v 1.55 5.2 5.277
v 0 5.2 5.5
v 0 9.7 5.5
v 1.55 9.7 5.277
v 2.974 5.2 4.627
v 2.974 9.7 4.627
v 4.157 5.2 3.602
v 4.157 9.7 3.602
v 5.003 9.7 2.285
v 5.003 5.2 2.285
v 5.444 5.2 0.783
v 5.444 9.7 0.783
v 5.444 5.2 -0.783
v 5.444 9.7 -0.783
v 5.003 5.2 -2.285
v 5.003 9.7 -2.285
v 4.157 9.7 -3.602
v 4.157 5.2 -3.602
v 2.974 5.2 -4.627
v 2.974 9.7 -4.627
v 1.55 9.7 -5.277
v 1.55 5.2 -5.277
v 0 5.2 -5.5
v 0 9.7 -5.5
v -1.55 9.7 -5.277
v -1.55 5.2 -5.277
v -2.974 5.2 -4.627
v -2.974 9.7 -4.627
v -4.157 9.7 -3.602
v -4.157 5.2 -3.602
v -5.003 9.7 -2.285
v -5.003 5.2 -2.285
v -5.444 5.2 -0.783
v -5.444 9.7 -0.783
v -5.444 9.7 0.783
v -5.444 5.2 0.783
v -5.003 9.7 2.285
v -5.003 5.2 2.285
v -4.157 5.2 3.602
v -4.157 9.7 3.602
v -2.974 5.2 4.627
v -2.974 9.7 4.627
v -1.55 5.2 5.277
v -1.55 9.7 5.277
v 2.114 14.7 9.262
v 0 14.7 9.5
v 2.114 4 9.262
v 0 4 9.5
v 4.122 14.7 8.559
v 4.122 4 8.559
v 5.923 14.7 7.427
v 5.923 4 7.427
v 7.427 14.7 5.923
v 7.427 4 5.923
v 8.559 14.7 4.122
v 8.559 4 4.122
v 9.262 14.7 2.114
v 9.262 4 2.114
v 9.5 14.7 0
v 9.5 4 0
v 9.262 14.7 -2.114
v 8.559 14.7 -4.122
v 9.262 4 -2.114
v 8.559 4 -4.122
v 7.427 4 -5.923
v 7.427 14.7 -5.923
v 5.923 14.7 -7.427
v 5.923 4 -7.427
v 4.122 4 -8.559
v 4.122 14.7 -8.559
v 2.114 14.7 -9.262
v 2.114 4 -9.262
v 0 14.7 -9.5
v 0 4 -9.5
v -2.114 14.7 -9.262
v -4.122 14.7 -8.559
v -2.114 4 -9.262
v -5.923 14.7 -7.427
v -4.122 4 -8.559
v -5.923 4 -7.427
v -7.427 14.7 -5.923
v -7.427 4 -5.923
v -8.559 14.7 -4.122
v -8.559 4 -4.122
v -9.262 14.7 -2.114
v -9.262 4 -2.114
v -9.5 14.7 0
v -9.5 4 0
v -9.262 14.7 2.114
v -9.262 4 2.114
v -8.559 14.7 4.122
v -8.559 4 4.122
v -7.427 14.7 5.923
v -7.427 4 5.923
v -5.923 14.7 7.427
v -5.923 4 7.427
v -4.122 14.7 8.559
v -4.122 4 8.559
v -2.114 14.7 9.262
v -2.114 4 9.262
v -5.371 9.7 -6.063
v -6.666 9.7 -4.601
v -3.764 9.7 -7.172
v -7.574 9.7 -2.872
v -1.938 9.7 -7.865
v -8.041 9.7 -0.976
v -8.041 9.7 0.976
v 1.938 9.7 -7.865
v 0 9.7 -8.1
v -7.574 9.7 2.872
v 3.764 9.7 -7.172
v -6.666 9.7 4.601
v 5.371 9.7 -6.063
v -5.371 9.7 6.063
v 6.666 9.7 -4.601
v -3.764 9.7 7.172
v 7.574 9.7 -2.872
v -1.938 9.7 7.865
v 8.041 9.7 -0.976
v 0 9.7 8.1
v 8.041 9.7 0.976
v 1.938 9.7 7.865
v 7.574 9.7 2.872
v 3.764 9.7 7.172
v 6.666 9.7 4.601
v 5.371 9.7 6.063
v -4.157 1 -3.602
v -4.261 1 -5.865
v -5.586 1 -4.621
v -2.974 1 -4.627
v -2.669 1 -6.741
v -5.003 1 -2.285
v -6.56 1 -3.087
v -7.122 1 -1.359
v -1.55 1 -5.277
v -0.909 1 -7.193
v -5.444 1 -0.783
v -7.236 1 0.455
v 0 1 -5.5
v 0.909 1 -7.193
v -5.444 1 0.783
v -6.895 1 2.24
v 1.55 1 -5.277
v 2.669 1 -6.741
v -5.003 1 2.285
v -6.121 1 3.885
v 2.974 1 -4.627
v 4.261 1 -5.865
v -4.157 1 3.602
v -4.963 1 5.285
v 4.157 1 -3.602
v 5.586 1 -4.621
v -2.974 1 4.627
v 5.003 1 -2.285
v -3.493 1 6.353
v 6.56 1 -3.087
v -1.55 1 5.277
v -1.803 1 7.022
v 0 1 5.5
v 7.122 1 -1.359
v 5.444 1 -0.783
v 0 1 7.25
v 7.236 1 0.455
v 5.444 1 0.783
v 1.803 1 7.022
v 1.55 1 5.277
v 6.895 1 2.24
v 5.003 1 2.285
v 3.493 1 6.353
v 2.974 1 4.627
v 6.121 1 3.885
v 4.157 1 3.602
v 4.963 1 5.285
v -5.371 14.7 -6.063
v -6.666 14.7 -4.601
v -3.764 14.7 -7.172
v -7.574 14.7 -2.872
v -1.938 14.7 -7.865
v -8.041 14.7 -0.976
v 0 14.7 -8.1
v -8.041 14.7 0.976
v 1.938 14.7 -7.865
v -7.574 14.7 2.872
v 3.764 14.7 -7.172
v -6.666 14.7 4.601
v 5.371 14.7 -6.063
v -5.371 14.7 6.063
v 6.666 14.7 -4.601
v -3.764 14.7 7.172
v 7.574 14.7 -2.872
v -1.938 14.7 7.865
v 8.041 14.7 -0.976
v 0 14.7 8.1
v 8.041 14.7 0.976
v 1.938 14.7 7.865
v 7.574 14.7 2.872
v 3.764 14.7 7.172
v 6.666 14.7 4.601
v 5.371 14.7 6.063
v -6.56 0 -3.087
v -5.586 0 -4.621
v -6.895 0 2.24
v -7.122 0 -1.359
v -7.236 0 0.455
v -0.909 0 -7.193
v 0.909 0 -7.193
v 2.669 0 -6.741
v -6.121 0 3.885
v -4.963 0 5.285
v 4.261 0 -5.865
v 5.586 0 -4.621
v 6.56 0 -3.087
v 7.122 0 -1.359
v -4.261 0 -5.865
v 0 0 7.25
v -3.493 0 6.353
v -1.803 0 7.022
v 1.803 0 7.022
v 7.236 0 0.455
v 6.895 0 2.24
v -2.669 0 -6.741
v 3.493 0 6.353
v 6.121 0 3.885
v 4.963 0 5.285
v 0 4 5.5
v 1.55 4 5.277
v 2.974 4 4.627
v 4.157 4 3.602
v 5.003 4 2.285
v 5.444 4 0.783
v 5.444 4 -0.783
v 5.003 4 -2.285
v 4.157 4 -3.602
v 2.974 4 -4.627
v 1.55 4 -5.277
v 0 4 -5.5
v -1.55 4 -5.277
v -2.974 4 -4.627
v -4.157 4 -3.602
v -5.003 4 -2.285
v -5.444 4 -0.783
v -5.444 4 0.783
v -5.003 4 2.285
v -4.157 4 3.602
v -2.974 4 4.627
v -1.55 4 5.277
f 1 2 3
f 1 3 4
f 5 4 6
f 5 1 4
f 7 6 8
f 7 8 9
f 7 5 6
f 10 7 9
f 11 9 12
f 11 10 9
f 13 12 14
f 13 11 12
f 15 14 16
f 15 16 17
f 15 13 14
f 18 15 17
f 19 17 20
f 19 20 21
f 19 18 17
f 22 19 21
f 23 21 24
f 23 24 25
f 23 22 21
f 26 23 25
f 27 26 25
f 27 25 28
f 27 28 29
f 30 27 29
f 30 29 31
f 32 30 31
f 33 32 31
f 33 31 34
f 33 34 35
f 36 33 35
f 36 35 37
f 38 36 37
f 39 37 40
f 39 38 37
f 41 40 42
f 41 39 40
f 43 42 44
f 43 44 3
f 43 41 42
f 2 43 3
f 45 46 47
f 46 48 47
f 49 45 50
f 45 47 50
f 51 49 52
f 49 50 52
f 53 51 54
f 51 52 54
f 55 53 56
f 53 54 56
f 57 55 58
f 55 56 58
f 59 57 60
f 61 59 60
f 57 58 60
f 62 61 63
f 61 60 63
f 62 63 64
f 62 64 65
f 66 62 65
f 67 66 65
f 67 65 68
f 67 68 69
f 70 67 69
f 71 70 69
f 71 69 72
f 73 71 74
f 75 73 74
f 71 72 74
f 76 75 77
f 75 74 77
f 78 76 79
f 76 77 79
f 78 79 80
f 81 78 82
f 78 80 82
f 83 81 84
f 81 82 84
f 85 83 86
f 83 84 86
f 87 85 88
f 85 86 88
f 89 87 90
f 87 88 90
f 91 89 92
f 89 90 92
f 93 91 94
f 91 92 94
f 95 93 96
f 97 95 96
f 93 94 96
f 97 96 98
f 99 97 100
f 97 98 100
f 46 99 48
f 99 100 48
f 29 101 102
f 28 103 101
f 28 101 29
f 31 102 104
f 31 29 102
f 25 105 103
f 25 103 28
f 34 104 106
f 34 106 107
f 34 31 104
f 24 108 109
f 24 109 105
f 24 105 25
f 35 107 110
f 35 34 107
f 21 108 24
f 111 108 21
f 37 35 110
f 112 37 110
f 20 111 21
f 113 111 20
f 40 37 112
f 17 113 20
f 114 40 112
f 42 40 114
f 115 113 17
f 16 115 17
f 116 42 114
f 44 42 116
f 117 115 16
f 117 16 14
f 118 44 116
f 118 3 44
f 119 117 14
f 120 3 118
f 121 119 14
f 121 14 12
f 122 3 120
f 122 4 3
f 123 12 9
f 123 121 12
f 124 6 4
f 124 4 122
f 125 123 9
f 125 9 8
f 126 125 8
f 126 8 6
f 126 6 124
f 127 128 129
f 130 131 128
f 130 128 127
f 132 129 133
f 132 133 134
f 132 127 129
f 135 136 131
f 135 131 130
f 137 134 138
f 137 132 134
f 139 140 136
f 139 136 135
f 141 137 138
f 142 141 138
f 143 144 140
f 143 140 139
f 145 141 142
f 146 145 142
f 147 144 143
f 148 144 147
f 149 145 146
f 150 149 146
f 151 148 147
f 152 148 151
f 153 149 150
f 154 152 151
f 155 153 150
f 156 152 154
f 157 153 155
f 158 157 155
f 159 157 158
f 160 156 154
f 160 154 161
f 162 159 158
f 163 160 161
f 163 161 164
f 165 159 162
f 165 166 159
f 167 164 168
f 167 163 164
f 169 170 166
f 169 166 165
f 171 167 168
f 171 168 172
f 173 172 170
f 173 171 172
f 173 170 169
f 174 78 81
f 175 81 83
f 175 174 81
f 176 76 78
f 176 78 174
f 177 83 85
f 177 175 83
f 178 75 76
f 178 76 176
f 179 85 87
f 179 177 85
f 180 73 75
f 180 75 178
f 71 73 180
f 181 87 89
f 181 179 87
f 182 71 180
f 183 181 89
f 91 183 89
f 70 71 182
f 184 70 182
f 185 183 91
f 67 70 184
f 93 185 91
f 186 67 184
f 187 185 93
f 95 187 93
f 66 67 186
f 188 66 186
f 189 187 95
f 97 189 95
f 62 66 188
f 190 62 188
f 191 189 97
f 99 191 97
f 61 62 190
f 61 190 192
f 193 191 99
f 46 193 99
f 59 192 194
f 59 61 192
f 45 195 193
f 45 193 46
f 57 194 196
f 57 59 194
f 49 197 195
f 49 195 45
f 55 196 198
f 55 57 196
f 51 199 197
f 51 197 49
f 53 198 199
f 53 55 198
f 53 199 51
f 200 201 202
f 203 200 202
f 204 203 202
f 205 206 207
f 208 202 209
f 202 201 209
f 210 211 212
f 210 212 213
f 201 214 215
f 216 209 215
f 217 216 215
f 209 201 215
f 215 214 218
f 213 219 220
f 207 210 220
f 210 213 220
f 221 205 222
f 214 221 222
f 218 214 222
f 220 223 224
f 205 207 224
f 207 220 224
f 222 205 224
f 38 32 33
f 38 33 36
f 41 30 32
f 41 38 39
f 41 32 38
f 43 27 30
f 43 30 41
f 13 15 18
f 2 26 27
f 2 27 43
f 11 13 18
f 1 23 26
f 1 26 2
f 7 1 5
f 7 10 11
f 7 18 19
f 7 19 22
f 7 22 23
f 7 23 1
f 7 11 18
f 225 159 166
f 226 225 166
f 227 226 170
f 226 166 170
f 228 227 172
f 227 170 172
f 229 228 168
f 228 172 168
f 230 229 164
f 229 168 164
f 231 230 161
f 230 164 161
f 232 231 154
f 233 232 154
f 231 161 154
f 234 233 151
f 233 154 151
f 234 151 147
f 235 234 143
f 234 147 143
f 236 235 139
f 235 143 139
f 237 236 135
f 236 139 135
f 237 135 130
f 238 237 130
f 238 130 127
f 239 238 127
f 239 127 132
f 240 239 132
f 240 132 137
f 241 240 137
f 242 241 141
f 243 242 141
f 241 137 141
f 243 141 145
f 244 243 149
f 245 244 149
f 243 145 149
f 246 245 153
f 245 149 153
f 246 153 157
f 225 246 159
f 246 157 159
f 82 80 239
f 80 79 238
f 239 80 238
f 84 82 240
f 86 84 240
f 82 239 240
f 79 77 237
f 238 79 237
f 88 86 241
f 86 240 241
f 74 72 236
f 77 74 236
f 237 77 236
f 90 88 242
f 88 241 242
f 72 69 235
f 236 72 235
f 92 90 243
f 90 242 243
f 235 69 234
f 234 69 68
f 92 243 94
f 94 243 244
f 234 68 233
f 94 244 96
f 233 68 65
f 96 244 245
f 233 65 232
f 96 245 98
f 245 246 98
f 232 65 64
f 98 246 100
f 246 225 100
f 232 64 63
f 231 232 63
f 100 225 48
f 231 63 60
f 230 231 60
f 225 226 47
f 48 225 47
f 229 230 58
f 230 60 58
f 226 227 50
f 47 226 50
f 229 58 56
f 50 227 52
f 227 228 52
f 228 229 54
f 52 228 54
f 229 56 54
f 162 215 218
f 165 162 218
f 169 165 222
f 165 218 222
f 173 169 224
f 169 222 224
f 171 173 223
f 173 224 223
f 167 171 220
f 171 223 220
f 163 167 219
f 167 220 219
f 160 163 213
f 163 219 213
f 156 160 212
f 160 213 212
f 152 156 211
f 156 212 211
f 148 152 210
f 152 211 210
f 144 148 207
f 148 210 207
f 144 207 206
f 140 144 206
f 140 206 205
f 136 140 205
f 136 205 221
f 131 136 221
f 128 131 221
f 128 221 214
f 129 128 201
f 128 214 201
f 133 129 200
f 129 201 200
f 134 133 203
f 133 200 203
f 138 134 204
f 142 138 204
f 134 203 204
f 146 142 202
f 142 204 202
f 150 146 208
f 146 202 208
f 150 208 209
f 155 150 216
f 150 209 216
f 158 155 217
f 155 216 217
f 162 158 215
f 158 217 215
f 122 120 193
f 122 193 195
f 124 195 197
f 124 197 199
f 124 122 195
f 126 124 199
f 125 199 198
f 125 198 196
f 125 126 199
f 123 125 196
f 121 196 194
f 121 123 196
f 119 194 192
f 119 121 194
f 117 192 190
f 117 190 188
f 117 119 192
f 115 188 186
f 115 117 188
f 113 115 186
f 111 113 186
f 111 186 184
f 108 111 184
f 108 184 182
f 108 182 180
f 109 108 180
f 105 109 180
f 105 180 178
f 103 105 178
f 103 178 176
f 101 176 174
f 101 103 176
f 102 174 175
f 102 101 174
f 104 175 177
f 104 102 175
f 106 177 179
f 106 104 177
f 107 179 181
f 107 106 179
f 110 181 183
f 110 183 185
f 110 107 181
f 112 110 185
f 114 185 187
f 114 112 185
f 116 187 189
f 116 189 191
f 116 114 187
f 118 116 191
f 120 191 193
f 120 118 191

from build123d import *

# Parameters (mm, degrees)
SKETCH1_R           = 7.25
BOSS_EXTRUDE1_DEPTH = 1
SKETCH2_R           = 5.5
BOSS_EXTRUDE2_DEPTH = 3
SKETCH3_R           = 9.5
BOSS_EXTRUDE3_DEPTH = 1.2
SKETCH4_R           = 9.5
SKETCH4_R_2         = 5.5
BOSS_EXTRUDE4_DEPTH = 4.5
SKETCH5_R           = 9.5
SKETCH5_R_2         = 8.1
BOSS_EXTRUDE5_DEPTH = 5


with BuildPart() as part:
    # Sketch1 → Boss-Extrude1 (new body)
    with BuildSketch(Plane(origin=(0, 0, 0), x_dir=(1, 0, 0), z_dir=(0, 1, 0))):
        with Locations(Location((0, 0, 0), (0, 0, 270))):
            Circle(SKETCH1_R)
    extrude(amount=BOSS_EXTRUDE1_DEPTH)

    # Sketch2 → Boss-Extrude2 (add)
    with BuildSketch(Plane(origin=(0, 1, 0), x_dir=(1, 0, 0), z_dir=(0, 1, 0))):
        with Locations(Location((0, 0, 0), (0, 0, 270))):
            Circle(SKETCH2_R)
    extrude(amount=BOSS_EXTRUDE2_DEPTH)

    # Sketch3 → Boss-Extrude3 (add)
    with BuildSketch(Plane(origin=(0, 4, 0), x_dir=(1, 0, 0), z_dir=(0, 1, 0))):
        with Locations(Location((0, 0, 0), (0, 0, 270))):
            Circle(SKETCH3_R)
    extrude(amount=BOSS_EXTRUDE3_DEPTH)

    # Sketch4 → Boss-Extrude4 (add)
    with BuildSketch(Plane(origin=(0, 5.2, 0), x_dir=(1, 0, 0), z_dir=(0, 1, 0))):
        with Locations(Location((0, 0, 0), (0, 0, 270))):
            Circle(SKETCH4_R)
        with Locations(Location((0, 0, 0), (0, 0, 270))):
            Circle(SKETCH4_R_2, mode=Mode.SUBTRACT)
    extrude(amount=BOSS_EXTRUDE4_DEPTH)

    # Sketch5 → Boss-Extrude5 (add)
    with BuildSketch(Plane(origin=(0, 9.7, 0), x_dir=(1, 0, 0), z_dir=(0, 1, 0))):
        with Locations(Location((0, 0, 0), (0, 0, 270))):
            Circle(SKETCH5_R)
        with Locations(Location((0, 0, 0), (0, 0, 270))):
            Circle(SKETCH5_R_2, mode=Mode.SUBTRACT)
    extrude(amount=BOSS_EXTRUDE5_DEPTH)


solid = part.part
